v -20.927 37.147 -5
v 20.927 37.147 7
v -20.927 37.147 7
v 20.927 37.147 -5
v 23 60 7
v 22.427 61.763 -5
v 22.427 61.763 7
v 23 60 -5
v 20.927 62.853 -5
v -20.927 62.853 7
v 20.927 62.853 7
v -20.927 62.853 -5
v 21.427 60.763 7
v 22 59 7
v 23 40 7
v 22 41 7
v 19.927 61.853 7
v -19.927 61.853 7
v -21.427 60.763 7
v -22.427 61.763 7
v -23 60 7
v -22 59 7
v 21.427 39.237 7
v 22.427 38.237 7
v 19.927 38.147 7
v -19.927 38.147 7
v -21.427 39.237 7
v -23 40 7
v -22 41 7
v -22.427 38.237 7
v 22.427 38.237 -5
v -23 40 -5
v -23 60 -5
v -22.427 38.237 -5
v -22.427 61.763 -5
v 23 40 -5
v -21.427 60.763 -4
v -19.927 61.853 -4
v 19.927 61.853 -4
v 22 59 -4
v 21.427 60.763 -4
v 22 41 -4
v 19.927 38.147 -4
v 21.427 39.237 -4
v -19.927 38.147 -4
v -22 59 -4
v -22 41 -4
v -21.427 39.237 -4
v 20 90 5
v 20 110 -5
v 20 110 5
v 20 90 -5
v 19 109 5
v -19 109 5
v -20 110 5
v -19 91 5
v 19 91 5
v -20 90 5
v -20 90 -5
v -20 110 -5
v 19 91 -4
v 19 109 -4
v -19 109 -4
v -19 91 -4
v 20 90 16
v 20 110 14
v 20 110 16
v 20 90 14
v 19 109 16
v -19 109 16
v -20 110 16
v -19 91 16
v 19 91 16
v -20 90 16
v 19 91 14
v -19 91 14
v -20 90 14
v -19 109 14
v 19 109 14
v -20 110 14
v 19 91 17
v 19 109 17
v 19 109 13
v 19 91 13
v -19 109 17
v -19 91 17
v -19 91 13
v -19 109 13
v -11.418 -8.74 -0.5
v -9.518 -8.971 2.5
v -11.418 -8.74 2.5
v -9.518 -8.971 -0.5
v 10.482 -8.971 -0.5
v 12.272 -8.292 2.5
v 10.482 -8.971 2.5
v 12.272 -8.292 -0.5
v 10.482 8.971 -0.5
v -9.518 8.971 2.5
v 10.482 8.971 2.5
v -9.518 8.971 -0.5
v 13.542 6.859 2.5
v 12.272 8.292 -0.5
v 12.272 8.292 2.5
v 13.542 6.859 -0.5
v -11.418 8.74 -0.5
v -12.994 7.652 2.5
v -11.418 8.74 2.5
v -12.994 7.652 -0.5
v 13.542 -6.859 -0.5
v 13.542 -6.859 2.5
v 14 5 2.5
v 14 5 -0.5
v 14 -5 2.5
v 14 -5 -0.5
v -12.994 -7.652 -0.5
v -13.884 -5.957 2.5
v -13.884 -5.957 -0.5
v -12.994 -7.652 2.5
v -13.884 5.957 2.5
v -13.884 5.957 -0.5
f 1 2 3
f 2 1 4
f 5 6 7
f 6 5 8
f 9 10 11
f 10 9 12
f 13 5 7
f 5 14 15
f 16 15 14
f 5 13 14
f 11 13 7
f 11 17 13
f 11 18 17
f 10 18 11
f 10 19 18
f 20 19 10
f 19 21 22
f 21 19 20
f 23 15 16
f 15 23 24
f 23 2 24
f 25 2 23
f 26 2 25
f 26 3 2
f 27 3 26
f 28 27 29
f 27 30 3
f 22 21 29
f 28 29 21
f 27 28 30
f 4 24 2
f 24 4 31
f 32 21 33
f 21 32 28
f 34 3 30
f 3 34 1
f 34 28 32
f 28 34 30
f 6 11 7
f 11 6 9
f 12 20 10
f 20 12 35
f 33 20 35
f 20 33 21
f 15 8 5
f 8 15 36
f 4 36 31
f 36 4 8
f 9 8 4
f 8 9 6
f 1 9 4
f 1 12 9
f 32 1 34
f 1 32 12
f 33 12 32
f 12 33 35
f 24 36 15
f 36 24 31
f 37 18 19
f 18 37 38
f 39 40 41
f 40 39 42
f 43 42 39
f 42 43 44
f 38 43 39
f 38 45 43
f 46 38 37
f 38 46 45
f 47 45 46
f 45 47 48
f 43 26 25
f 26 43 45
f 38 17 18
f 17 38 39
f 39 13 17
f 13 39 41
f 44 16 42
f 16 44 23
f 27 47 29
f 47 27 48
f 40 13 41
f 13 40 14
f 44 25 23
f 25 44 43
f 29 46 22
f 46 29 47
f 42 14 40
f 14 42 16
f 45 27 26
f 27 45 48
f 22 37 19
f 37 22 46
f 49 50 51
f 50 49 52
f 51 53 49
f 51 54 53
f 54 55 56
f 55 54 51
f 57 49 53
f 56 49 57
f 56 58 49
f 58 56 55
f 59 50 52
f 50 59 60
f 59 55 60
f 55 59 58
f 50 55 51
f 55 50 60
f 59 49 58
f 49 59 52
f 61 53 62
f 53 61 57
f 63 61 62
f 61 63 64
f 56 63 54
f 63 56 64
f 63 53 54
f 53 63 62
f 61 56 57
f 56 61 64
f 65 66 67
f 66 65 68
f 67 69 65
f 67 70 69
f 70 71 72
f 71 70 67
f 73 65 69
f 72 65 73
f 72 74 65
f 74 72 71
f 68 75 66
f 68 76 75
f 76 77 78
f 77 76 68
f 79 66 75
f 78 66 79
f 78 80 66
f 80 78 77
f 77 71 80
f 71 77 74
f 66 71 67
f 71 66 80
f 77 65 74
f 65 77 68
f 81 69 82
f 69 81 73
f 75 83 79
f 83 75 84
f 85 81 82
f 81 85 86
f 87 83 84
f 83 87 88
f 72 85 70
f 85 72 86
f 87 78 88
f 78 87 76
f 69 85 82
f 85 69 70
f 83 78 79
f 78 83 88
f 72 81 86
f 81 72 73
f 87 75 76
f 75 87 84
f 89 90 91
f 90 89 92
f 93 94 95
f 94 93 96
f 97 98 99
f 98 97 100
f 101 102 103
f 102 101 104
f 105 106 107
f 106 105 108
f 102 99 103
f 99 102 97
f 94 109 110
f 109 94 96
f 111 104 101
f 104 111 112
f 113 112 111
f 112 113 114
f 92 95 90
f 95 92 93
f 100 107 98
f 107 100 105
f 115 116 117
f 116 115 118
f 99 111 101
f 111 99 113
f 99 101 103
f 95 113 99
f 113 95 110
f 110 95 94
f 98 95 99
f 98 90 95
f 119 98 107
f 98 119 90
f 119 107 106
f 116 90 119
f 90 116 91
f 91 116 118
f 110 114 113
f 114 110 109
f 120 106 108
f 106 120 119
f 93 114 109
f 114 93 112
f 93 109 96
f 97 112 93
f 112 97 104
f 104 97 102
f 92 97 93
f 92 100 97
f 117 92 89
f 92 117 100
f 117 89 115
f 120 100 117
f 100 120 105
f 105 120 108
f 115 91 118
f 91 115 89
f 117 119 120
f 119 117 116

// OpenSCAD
// Other ways to build parts
/*

Sage Ridge Robotics OpenSCAD file.
Christopher von Nagy, July 2014.

Example 07 Constructing objects.

*/


// OpenSCAD has a few tricks for constructing objects
// that inolve the clever combination of geometric
// primitives, cubes, spheres, etc.

// The minkowski() command is one such tool. We are
// going to use it to create a small box with rounded corners.

// First the basic shape is generated. You can change the size
// of the cylinders to alter the rounding of the corner.

translate([0,0,0])
minkowski()
{
    cube([20,10,1], center=true);
    cylinder(r=4,h=2);
};

// Great. Let's build the box by defining the outer box
// as a minkowski() object then subtracting a slightly
// smaller box to leave 1mm walls.

translate([0,50,0])
difference()
{
    minkowski()
    {
        cube([40,20,10], center=true);
        cylinder(r=3,h=2);
    }
    translate([0,0,1])
    minkowski()
    {
        cube([38,18,10], center=true);
        cylinder(r=3,h=2);
    }
};


// Building a box and top is even easier if you do
// not want rounded corners.

translate([0,100,0])
difference()
{
    cube([40,20,10], center=true);
    translate([0,0,1]) cube([38,18,10], center=true);
}

translate([0,100,15])
union()
{
    cube([40,20,2], center=true);
    translate(0,0,0) cube([38,18,4], center=true);
}

/*

License code:

Creative Commons Atribution 4.0

Attribution — You must give appropriate credit, provide a link to the license, and indicate if changes were made. You may do so in any reasonable manner, but not in any way that suggests the licensor endorses you or your use.

No additional restrictions — You may not apply legal terms or technological measures that legally restrict others from doing anything the license permits.


*/
